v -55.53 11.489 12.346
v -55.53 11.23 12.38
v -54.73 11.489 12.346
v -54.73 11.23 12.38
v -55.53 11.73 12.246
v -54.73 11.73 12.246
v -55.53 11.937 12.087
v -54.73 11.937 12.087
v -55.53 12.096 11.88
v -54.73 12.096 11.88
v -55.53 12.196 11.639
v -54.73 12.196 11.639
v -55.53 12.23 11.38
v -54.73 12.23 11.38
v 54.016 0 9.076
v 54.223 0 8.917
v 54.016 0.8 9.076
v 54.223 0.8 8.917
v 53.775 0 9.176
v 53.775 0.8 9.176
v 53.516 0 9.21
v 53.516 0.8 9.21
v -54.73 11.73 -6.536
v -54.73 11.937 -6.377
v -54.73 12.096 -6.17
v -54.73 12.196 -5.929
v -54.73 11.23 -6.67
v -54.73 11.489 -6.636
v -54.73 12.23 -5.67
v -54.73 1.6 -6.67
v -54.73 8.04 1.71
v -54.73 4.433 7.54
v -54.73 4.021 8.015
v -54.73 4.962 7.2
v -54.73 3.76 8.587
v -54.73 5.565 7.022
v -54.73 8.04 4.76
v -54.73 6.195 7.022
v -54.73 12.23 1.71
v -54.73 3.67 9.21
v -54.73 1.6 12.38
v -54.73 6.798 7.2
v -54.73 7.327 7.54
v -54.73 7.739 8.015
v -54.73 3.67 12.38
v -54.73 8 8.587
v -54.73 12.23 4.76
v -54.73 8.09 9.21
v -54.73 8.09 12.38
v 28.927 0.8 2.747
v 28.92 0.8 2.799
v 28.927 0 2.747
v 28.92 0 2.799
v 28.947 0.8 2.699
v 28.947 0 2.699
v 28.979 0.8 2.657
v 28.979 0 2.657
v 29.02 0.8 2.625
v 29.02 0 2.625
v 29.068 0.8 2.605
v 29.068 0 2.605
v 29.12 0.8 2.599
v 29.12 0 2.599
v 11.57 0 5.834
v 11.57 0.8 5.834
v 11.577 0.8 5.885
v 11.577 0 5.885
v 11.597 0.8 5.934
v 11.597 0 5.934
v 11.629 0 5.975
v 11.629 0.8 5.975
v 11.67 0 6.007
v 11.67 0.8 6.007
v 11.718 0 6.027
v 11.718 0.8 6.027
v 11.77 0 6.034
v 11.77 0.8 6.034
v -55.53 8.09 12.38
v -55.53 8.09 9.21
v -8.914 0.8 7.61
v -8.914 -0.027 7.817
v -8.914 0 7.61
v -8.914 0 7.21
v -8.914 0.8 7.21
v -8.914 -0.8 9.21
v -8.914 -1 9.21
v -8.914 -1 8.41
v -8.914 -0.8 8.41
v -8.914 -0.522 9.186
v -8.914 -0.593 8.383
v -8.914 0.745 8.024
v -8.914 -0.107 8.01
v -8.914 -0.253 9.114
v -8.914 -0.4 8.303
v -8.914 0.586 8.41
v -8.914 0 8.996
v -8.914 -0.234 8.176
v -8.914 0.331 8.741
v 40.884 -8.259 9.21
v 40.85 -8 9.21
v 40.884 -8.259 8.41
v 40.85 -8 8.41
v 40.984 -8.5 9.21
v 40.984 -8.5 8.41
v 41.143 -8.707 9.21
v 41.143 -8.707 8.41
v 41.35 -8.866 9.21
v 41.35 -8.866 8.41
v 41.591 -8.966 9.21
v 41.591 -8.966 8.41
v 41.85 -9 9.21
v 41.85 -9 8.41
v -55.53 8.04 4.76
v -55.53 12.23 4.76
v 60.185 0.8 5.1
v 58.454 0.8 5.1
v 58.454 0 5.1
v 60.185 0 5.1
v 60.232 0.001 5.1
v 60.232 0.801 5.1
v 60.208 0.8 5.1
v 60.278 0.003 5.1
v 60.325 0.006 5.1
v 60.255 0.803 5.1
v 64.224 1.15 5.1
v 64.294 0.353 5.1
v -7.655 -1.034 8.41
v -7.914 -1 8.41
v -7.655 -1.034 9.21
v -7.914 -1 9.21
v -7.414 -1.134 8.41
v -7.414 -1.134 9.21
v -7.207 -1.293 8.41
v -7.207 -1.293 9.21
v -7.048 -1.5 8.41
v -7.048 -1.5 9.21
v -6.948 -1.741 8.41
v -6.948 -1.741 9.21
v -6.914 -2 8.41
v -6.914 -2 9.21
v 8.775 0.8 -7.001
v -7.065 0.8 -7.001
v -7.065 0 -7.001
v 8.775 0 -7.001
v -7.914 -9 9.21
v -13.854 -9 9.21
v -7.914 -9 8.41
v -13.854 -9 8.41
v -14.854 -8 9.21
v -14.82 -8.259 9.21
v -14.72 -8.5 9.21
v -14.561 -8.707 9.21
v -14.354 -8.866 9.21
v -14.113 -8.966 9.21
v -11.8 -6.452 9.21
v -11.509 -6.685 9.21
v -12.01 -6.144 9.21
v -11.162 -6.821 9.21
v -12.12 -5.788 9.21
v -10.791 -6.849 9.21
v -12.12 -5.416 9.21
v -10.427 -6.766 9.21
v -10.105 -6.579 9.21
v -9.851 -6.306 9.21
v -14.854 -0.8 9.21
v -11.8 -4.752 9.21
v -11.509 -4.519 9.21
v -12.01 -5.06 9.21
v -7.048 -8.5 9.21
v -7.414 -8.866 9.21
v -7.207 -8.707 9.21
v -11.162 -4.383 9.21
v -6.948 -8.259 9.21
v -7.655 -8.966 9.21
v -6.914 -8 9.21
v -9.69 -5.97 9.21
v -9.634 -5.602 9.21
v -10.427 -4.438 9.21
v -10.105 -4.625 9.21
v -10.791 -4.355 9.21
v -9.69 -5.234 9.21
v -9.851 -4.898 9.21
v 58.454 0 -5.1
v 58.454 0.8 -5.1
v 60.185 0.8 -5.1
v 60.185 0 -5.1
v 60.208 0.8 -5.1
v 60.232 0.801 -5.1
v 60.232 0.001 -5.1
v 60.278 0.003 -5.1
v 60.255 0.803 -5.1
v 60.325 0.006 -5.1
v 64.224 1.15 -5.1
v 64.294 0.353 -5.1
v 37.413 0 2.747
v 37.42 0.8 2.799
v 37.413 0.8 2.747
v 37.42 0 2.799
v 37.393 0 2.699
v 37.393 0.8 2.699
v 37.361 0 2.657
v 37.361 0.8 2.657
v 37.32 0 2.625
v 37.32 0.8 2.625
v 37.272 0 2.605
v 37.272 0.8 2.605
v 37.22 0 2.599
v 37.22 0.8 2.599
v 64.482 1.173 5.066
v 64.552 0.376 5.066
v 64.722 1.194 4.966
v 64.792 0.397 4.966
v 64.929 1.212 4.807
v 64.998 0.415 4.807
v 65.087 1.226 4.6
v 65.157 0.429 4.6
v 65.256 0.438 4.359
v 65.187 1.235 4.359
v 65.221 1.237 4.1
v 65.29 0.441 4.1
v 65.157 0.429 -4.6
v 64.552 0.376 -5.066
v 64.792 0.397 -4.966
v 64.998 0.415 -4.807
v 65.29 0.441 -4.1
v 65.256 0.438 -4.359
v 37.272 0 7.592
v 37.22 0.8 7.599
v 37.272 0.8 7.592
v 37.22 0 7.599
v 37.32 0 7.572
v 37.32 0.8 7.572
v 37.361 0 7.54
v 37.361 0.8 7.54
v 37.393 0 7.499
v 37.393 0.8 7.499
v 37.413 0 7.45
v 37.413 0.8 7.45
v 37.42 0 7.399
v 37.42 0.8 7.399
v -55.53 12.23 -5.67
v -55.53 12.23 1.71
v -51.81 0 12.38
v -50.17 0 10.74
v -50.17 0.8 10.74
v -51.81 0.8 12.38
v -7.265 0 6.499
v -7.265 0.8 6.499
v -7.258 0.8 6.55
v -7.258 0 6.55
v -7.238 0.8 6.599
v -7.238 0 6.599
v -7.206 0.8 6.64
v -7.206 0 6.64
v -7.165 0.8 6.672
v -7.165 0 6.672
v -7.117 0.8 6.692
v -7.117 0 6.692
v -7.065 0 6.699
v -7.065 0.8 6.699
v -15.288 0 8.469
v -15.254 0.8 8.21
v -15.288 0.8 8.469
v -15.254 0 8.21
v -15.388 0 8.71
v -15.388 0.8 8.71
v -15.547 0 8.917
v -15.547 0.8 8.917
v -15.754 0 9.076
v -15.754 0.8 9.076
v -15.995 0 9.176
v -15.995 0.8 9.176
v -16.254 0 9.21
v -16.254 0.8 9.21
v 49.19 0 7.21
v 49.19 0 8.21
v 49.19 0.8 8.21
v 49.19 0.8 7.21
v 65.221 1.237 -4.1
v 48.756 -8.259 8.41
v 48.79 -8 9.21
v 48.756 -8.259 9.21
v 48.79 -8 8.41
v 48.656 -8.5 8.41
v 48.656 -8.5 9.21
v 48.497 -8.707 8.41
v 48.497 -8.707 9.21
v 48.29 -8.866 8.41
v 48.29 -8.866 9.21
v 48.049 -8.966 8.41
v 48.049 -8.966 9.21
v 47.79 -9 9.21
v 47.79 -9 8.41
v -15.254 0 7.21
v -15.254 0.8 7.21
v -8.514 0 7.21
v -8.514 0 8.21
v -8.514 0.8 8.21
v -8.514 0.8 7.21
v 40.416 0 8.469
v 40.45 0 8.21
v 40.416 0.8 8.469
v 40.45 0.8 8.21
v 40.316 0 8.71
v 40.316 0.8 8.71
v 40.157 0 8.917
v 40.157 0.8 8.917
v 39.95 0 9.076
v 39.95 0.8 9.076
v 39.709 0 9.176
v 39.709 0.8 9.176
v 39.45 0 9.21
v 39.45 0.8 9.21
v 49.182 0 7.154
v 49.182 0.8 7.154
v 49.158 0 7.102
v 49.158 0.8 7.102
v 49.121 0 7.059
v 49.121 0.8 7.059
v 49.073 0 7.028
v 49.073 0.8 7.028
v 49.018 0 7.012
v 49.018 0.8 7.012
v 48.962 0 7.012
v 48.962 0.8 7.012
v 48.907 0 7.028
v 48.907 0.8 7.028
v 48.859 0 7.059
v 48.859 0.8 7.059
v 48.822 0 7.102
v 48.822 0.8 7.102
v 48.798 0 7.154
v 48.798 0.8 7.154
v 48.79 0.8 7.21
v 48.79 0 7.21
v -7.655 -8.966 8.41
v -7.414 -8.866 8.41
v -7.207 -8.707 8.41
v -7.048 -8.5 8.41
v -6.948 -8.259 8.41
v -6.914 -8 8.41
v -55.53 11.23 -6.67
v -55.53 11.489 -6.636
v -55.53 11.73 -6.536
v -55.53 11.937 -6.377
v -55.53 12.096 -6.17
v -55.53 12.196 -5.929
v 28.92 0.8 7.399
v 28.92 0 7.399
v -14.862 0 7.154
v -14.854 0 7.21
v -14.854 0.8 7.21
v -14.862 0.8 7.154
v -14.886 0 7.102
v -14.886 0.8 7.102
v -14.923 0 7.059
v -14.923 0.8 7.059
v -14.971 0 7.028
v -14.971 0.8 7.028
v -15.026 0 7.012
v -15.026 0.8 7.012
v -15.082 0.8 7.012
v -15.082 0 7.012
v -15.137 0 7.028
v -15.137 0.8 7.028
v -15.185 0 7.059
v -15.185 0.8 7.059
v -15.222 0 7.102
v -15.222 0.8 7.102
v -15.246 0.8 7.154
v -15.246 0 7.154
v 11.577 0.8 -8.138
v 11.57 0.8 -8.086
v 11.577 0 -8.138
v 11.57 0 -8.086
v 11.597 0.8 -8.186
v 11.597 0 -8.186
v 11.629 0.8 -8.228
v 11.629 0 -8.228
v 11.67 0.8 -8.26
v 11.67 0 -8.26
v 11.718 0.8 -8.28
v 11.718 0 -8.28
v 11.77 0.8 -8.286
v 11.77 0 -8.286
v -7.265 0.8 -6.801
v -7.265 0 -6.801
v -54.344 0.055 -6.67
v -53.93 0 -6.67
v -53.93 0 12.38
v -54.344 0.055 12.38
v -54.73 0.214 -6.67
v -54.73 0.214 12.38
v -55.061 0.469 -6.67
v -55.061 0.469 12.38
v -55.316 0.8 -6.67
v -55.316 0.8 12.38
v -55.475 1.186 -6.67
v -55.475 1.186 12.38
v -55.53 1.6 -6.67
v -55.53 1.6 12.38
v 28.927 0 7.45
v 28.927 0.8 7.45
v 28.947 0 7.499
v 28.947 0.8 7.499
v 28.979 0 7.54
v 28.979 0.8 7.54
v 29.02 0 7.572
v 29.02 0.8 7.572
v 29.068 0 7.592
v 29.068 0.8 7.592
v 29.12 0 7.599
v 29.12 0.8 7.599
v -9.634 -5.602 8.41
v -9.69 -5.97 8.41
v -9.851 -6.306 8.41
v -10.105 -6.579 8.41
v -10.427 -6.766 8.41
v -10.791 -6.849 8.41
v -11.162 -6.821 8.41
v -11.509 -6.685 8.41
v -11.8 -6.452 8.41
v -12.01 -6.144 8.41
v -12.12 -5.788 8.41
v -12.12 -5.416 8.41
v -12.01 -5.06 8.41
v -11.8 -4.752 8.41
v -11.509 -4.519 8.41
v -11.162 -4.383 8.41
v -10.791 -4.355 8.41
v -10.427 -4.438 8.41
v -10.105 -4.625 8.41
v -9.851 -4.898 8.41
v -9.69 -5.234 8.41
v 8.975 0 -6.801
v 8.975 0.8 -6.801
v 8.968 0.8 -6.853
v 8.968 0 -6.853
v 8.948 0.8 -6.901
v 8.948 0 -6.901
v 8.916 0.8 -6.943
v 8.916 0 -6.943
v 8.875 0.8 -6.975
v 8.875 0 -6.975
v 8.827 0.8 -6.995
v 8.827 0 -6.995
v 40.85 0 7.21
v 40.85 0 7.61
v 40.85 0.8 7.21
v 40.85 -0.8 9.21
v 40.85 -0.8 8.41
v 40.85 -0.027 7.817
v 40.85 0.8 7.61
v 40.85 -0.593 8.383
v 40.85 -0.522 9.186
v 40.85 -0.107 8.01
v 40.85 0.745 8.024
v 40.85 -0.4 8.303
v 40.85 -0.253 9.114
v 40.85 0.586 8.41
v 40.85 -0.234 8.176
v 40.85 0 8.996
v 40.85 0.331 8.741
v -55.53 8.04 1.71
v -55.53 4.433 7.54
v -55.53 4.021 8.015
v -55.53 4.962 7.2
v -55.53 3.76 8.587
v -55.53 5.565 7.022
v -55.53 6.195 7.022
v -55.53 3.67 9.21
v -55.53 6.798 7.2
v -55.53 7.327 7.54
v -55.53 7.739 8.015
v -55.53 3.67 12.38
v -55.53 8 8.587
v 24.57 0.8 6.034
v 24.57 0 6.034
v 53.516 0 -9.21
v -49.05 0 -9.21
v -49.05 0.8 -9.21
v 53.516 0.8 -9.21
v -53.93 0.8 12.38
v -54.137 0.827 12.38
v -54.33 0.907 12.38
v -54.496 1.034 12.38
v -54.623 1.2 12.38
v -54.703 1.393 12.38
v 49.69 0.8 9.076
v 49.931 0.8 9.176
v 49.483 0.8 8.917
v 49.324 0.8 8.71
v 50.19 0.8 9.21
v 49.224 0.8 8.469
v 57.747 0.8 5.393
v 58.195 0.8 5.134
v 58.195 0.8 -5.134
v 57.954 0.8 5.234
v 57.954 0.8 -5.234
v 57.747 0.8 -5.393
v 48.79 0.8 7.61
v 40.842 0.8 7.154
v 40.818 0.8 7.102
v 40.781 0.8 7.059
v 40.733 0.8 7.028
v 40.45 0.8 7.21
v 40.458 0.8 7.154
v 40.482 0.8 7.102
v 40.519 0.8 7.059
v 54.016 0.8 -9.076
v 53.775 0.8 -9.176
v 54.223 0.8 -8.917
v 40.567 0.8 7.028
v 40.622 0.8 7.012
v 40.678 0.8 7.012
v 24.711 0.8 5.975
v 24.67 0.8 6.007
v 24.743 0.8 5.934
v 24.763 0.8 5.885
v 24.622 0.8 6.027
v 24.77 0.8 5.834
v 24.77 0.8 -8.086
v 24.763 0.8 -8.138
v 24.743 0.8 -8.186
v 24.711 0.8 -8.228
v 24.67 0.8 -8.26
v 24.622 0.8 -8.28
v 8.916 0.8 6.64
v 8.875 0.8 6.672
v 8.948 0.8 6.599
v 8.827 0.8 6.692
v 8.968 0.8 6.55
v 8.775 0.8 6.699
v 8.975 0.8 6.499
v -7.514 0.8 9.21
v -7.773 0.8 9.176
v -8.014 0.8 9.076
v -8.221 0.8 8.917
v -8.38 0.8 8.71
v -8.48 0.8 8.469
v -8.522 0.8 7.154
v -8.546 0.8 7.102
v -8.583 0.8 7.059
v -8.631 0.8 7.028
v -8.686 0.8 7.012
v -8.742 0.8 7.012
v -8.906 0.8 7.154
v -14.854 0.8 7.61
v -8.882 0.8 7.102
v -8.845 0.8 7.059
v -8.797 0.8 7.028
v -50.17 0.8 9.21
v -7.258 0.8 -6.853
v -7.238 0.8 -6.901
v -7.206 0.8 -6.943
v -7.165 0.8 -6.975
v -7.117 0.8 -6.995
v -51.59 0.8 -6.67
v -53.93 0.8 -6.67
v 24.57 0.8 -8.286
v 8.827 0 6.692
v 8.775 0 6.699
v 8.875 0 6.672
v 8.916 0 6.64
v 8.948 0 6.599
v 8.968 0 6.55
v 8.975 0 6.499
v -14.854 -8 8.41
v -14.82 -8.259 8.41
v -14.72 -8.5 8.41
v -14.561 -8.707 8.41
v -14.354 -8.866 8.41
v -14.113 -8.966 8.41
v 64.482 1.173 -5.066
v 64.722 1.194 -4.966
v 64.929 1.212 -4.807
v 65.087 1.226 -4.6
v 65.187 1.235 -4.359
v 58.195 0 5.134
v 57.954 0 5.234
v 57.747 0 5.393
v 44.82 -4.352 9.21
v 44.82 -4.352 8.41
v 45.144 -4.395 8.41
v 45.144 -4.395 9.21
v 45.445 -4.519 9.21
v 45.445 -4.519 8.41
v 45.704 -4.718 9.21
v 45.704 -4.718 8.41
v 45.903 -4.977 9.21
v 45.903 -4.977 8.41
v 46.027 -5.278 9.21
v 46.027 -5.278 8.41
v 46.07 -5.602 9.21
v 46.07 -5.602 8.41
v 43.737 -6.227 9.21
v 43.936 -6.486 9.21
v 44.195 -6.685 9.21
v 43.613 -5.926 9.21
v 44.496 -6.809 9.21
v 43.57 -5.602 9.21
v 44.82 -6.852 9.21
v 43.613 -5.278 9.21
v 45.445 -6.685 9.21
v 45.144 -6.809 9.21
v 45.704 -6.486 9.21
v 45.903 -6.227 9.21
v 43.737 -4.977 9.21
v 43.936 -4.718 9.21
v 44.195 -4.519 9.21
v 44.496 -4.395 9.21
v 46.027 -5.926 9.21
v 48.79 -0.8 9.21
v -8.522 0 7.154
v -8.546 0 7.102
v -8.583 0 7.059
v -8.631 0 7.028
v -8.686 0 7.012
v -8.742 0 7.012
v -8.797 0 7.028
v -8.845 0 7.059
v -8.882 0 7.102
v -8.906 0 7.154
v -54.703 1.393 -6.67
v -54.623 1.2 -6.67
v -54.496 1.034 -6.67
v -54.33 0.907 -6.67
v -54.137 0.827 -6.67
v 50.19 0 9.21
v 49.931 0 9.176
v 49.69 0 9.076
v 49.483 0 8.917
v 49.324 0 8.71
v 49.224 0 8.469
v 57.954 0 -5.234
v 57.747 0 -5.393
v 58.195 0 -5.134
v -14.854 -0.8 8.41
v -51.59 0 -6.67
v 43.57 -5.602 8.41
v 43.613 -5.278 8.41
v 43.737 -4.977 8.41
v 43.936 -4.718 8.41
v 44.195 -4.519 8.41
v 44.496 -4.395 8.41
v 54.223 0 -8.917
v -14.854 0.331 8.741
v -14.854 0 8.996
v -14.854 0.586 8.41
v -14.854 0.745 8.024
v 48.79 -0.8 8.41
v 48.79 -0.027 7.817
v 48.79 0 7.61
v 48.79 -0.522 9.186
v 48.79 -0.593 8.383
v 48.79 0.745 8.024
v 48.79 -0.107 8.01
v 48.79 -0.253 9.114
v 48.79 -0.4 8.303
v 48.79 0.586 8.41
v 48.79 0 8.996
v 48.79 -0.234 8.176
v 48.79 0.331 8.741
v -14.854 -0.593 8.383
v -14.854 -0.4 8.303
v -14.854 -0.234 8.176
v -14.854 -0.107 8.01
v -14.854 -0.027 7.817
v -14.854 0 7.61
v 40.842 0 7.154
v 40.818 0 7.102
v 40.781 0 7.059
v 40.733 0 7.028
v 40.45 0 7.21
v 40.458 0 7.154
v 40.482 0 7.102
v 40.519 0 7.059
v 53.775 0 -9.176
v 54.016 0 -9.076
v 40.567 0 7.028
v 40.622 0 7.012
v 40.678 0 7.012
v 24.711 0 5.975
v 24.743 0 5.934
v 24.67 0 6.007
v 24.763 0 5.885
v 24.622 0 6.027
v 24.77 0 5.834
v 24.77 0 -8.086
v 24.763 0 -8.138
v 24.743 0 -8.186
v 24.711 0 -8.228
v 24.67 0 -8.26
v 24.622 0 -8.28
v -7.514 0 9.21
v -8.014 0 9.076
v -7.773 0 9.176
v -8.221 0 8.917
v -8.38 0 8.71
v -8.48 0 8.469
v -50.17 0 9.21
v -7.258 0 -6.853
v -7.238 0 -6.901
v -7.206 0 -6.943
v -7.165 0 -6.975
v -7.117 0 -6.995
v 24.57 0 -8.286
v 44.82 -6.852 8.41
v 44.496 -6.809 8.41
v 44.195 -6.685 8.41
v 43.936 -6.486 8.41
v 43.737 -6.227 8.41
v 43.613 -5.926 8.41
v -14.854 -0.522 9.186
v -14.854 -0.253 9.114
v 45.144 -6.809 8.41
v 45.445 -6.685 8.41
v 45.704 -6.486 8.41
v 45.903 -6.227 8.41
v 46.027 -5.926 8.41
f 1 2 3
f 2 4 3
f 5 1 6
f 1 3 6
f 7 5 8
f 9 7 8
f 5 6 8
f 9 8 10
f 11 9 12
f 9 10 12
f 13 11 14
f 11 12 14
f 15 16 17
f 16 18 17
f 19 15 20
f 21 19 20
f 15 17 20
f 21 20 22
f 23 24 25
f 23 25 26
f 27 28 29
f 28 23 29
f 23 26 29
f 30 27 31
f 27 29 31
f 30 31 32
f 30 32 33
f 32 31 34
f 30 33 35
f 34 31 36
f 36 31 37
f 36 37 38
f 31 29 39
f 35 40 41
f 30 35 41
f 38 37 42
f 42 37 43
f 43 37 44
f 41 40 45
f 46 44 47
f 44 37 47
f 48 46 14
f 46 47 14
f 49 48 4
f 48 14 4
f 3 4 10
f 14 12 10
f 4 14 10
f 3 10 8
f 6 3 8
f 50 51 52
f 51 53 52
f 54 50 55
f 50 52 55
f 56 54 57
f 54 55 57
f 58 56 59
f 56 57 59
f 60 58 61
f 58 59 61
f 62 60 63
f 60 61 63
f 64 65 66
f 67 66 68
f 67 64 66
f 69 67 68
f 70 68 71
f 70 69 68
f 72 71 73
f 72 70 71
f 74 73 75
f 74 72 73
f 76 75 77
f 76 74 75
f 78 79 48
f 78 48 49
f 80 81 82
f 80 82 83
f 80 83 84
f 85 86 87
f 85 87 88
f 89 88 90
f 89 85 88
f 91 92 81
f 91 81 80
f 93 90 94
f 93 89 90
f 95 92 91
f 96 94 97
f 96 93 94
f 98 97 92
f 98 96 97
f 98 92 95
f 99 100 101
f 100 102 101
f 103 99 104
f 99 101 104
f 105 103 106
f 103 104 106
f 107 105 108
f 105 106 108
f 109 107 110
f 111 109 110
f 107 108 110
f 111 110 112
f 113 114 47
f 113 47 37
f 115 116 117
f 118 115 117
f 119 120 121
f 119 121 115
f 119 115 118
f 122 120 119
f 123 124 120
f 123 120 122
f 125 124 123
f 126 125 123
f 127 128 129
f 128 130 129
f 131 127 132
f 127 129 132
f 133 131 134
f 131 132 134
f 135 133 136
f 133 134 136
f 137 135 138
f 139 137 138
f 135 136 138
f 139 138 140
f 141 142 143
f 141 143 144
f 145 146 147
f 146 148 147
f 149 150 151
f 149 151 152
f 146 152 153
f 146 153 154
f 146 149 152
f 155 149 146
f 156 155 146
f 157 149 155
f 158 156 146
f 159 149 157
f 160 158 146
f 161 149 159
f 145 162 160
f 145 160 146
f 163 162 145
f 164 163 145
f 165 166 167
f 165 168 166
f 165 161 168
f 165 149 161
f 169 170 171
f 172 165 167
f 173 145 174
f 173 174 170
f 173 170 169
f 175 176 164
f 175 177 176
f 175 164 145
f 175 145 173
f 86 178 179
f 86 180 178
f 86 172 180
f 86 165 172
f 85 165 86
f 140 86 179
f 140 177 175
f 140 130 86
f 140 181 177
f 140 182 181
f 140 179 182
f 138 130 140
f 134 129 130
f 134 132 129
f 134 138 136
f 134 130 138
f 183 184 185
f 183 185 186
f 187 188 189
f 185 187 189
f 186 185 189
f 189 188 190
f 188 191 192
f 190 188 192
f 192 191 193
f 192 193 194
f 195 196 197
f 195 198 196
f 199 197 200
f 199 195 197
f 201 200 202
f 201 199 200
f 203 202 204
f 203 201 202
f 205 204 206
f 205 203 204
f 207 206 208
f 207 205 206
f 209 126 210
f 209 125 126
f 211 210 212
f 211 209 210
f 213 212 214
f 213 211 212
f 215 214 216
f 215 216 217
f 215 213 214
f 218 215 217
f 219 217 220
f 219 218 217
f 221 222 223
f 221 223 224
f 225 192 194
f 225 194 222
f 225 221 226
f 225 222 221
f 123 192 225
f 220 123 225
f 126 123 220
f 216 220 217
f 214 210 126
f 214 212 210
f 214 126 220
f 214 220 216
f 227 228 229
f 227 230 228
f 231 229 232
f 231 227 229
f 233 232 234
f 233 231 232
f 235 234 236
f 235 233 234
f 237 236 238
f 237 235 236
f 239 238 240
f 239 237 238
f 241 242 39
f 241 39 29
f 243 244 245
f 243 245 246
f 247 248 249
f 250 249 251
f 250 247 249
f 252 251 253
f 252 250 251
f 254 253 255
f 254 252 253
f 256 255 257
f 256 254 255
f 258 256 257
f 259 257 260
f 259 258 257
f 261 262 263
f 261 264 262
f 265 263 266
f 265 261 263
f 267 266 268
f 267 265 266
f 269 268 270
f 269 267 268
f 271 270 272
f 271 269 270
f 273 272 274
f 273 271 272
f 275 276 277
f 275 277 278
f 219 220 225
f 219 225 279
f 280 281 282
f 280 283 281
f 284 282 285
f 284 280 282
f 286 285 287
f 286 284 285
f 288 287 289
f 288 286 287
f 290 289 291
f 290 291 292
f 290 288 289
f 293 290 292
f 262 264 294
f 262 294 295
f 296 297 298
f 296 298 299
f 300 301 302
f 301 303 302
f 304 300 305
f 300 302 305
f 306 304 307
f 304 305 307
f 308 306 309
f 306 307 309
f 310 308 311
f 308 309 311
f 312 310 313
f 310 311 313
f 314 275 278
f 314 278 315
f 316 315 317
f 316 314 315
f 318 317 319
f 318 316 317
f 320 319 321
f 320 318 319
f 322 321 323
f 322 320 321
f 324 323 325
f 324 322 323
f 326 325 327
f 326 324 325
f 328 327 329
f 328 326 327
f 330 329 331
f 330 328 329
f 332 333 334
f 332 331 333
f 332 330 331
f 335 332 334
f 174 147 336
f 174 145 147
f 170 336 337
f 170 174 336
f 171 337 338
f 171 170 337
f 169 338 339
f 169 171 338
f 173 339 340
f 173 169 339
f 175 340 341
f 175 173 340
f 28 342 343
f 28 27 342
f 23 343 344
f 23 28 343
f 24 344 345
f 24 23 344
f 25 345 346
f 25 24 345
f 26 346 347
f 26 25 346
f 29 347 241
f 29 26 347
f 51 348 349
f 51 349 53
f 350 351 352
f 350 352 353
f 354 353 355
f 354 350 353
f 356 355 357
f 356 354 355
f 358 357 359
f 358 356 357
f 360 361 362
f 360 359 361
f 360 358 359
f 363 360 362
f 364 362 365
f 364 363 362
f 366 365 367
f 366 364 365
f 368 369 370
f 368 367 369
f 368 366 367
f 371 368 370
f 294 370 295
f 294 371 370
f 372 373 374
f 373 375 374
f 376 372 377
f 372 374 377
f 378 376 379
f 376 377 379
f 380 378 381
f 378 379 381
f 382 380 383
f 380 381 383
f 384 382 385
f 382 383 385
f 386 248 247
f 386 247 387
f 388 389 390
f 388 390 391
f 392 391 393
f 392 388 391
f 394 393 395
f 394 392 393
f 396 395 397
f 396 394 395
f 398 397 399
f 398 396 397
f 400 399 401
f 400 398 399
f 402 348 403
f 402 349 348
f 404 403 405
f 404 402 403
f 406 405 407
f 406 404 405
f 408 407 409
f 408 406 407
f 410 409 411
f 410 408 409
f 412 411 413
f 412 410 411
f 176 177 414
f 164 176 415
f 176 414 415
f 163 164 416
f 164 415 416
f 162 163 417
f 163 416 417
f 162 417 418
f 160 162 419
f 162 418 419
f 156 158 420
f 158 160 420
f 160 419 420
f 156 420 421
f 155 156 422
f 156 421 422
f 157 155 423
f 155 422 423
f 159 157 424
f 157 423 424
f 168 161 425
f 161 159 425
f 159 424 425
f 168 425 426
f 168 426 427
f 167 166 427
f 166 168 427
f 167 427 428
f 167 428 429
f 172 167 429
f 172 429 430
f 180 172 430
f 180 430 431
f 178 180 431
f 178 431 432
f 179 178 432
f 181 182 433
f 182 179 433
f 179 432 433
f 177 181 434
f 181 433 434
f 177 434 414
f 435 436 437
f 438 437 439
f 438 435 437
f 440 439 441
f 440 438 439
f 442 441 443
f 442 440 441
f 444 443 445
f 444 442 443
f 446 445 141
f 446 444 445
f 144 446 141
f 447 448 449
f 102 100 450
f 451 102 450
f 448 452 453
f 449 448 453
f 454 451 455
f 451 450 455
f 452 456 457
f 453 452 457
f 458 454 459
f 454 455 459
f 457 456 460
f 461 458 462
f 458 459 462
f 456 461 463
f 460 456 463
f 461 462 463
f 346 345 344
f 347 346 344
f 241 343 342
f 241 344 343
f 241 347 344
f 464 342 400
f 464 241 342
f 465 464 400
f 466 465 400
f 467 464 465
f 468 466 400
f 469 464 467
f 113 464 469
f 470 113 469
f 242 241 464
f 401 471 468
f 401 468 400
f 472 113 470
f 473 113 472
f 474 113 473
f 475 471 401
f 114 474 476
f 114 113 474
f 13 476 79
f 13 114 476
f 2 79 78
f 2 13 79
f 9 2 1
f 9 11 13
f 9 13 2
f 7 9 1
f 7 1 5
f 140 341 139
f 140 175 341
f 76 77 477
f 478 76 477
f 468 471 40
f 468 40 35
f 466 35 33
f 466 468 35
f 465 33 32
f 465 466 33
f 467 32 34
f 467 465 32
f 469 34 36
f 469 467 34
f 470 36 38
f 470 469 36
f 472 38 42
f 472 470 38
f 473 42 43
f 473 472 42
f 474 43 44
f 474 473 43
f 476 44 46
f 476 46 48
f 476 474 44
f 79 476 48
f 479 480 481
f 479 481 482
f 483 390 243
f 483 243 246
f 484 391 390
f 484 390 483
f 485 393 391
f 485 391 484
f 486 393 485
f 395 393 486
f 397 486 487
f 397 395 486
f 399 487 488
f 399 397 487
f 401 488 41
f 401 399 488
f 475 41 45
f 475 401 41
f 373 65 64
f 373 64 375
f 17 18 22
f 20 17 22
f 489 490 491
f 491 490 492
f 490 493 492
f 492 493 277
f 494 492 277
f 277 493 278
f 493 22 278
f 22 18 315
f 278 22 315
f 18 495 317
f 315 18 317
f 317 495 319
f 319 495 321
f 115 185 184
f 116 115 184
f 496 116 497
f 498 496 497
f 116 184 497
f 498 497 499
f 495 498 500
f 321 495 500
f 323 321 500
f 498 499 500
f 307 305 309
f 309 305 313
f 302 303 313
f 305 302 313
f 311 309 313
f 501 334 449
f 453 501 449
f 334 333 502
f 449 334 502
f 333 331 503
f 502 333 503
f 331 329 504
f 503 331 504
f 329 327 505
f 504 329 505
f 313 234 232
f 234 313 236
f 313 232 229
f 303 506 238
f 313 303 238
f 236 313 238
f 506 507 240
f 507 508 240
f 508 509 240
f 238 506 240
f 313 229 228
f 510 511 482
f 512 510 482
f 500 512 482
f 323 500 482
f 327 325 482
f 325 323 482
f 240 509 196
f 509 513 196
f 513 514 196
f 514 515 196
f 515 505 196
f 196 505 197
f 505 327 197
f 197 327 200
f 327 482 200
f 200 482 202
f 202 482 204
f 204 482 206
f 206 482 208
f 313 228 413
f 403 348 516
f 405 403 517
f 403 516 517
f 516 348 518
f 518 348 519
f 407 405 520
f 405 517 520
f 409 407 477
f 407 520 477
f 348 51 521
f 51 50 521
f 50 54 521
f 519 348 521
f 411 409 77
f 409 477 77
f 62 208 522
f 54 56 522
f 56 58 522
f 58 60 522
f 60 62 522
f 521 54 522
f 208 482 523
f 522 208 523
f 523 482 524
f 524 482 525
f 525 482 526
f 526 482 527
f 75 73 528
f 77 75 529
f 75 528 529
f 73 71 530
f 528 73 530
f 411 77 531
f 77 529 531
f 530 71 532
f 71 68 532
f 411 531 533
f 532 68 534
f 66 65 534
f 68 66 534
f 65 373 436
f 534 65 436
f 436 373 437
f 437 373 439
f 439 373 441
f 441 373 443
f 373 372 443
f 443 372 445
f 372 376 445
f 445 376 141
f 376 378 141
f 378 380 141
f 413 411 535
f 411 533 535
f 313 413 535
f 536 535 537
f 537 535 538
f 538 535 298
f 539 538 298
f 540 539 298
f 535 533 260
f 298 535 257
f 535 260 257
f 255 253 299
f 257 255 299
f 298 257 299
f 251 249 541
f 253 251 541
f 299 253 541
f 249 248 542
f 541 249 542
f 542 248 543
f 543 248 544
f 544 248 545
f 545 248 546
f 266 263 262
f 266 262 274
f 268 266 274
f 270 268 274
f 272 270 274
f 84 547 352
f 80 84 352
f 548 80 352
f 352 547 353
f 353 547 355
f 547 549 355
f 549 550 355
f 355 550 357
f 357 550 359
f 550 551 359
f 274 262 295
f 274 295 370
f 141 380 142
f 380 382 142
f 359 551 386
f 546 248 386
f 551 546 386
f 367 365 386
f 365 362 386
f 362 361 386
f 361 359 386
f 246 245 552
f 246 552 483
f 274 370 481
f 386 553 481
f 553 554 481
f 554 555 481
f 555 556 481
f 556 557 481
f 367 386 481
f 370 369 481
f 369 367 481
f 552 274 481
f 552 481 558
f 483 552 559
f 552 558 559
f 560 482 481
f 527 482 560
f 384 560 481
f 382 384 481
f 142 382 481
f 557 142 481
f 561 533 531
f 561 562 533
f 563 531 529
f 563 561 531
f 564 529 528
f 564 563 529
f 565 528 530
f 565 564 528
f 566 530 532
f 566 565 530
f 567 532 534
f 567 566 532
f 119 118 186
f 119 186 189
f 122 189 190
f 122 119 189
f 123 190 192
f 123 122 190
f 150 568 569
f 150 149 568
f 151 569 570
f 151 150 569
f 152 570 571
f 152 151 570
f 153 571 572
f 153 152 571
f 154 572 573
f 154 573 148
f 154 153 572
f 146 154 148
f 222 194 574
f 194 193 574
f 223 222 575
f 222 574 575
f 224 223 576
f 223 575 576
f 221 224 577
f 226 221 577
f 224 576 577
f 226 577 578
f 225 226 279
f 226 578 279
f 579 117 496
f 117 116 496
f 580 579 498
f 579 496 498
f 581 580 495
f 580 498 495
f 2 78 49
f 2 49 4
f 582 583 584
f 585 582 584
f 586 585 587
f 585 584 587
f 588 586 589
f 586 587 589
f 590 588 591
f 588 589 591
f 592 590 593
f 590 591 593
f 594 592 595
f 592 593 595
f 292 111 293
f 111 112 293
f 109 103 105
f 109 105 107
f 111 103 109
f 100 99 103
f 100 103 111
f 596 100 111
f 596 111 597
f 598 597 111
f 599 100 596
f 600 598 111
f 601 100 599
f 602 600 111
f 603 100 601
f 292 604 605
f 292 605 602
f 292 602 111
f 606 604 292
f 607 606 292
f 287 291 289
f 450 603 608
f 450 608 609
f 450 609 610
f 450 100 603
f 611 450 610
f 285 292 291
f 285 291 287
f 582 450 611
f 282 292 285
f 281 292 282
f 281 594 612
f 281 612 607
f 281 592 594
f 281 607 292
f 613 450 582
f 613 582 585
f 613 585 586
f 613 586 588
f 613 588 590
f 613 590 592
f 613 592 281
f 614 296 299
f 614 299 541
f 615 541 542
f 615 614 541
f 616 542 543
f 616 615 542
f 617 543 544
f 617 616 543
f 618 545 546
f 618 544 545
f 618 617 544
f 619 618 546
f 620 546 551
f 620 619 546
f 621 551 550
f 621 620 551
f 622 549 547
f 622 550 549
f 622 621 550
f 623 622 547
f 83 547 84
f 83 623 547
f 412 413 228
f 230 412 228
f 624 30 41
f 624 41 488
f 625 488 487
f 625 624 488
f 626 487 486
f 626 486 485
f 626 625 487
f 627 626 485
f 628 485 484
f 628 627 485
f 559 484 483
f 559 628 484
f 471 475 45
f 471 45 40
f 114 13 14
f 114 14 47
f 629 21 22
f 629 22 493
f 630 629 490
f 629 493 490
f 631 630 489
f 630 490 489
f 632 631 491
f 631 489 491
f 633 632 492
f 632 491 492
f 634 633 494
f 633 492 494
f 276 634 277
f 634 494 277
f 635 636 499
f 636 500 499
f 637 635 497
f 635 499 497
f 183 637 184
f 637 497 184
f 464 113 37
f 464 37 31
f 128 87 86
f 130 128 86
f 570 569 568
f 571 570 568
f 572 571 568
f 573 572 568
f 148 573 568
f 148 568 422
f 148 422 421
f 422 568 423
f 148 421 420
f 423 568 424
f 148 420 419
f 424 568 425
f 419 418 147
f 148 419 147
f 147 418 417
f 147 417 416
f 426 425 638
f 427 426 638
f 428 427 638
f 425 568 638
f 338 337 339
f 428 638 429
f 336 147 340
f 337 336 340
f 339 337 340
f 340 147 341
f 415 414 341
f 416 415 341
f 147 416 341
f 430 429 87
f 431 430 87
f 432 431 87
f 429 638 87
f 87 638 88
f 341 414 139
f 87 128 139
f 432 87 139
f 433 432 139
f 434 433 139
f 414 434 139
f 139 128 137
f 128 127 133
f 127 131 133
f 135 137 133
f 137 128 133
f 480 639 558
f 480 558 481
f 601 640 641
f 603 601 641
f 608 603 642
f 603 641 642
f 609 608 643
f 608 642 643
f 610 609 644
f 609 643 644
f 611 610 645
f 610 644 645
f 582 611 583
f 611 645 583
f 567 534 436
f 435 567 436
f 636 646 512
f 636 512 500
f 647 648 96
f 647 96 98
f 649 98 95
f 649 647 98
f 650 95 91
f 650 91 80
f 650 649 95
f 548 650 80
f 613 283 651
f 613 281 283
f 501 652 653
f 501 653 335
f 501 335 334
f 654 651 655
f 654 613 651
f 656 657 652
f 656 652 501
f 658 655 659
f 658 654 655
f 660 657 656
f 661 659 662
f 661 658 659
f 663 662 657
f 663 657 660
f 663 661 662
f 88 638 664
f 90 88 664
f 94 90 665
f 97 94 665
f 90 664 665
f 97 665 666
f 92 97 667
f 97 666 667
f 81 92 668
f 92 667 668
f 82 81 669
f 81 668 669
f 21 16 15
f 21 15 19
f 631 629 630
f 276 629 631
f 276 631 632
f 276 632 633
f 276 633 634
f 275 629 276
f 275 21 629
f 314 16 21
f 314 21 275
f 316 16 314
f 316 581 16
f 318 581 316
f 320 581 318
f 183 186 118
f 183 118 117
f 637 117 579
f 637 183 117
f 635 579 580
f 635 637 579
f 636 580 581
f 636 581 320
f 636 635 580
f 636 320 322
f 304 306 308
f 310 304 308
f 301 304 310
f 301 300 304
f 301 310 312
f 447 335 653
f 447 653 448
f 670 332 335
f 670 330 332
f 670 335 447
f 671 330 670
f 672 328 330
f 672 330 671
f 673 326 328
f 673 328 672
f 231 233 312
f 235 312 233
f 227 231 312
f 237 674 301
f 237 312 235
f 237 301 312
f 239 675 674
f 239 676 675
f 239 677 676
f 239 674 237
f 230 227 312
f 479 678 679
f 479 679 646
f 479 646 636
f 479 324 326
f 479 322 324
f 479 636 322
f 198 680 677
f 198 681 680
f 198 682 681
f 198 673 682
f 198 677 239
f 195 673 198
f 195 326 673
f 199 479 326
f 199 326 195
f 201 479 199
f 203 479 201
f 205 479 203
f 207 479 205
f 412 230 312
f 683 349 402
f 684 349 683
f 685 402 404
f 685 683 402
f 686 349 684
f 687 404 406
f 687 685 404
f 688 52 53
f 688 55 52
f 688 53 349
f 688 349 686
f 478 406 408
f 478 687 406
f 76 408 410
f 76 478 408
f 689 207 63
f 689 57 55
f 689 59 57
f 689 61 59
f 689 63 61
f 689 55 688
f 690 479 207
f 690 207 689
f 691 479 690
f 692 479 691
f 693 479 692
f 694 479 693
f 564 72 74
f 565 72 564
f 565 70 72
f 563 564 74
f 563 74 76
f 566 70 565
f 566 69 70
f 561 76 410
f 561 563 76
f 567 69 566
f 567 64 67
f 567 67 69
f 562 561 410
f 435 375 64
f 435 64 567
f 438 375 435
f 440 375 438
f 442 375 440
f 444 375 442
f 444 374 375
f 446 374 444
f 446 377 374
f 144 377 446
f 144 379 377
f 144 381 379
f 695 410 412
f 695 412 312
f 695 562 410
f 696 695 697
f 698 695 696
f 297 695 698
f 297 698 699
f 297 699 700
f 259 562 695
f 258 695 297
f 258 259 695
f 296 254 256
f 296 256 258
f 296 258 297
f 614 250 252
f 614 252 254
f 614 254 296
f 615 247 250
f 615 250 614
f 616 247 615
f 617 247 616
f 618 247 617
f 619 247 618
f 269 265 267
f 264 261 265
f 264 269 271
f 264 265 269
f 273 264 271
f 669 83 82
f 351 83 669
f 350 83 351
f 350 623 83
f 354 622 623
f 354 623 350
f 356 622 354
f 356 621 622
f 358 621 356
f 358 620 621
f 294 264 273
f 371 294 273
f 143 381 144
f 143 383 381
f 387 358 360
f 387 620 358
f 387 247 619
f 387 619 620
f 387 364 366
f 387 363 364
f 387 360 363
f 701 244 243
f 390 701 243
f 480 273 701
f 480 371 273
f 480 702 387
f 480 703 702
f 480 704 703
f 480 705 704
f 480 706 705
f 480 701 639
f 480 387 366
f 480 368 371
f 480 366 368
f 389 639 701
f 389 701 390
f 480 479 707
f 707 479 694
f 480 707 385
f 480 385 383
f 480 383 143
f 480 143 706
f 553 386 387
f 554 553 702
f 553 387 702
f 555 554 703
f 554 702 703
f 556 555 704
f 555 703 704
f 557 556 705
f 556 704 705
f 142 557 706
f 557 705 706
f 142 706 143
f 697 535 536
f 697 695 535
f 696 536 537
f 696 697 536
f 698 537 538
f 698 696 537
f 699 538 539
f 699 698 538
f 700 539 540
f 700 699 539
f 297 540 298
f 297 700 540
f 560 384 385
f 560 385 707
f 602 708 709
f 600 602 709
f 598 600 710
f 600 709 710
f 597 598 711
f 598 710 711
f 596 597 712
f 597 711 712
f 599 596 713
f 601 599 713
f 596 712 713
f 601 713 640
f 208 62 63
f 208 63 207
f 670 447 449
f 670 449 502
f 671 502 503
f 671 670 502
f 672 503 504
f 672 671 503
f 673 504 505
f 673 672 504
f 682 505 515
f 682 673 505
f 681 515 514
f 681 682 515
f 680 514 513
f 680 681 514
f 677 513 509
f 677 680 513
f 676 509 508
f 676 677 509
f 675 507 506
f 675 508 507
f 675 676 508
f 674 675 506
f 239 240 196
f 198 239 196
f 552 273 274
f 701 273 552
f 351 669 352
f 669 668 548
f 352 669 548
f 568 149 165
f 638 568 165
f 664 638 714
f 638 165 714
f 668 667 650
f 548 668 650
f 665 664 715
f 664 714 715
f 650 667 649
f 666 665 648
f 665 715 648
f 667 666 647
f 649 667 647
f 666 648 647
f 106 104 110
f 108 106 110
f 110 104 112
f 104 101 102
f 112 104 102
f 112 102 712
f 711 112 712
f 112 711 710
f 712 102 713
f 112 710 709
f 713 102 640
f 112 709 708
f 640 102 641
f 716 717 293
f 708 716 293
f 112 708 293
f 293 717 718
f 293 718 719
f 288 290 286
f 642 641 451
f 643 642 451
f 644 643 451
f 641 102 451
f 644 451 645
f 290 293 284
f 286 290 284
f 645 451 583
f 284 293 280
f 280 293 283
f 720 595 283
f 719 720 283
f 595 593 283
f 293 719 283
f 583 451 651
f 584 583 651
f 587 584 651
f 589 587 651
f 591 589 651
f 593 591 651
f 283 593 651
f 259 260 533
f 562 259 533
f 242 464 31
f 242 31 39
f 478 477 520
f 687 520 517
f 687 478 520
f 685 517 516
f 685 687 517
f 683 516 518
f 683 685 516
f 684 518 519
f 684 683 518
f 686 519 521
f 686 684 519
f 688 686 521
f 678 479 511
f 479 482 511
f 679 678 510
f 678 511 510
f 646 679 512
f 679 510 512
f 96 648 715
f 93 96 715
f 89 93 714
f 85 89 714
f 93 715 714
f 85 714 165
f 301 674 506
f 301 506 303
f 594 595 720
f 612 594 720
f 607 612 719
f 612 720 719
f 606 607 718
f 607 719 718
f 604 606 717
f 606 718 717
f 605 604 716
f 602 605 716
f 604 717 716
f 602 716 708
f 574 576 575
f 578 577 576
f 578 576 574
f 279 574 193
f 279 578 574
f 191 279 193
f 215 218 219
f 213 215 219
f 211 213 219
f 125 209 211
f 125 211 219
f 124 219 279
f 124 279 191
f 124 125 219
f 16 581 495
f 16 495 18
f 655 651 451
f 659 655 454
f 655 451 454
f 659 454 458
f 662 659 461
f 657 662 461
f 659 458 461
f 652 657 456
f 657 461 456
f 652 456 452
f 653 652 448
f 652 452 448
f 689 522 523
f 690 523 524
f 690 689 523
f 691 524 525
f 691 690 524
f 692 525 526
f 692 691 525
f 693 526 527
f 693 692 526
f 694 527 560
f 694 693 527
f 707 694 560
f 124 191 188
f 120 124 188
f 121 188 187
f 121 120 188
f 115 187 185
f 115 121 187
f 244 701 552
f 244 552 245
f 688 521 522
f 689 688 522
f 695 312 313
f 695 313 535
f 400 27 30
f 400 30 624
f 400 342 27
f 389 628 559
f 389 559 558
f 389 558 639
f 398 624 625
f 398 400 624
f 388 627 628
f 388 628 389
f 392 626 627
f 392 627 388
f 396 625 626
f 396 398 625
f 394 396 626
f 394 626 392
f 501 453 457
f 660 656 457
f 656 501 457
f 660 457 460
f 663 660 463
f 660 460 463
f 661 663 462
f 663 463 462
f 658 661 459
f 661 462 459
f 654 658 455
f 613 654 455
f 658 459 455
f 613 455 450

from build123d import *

# Parameters (mm, degrees)
SM_BASE_FLANGE_1_DEPTH           = 0.8
SKETCH_25_W                      = 16.240000001
SKETCH_25_H                      = 13.699999542
SKETCH_25_W_2                    = 13.2
SKETCH_25_H_2                    = 14.319999239
SKETCH_25_W_3                    = 8.5
SKETCH_25_H_3                    = 5
CUT_EXTRUDE_1_DEPTH              = 62.484573675
SM_EDGE_FLANGE_1_STRIP_CUT_DEPTH = 10.2
SM_EDGE_FLANGE_1_DEPTH           = 10.2
SM_START                         = -0.8
SM_EDGE_FLANGE_2_DEPTH           = 2.8
SM_START_2                       = 0.715504
SM_EDGE_FLANGE_2_2_OUTLINE_W     = 7.94
SM_EDGE_FLANGE_2_2_OUTLINE_H     = 0.8
SM_EDGE_FLANGE_2_2_DEPTH         = 1.284496
SM_START_3                       = -4.3519999
SM_EDGE_FLANGE_2_3_OUTLINE_W     = 7.94
SM_EDGE_FLANGE_2_3_OUTLINE_H     = 0.8
SM_EDGE_FLANGE_2_3_DEPTH         = 3.5519999
SM_START_4                       = -9
SM_EDGE_FLANGE_2_4_OUTLINE_W     = 7.94
SM_EDGE_FLANGE_2_4_OUTLINE_H     = 0.8
SM_EDGE_FLANGE_2_4_DEPTH         = 2.1479999
SM_START_5                       = 40.85
SM_EDGE_FLANGE_2_5_DEPTH         = 7.94
SM_EDGE_FLANGE_2_6_OUTLINE_W     = 2.5000002
SM_EDGE_FLANGE_2_6_OUTLINE_H     = 0.8
SM_EDGE_FLANGE_2_6_DEPTH         = 2.7199999
SM_START_6                       = 46.0700001
SM_EDGE_FLANGE_2_7_OUTLINE_W     = 2.5000002
SM_EDGE_FLANGE_2_7_OUTLINE_H     = 0.8
SM_EDGE_FLANGE_2_7_DEPTH         = 2.7199999
SM_START_7                       = 41.6657556
SM_EDGE_FLANGE_2_8_DEPTH         = 6.2856216
SM_START_8                       = 8.41
SM_EDGE_FLANGE_2_9_DEPTH         = 0.8
SM_START_9                       = -14.854
SM_EDGE_FLANGE_3_OUTLINE_W       = 8
SM_EDGE_FLANGE_3_OUTLINE_H       = 0.8
SM_EDGE_FLANGE_3_DEPTH           = 2.7199999
SM_START_10                      = -9.6339999
SM_EDGE_FLANGE_3_2_OUTLINE_W     = 8
SM_EDGE_FLANGE_3_2_OUTLINE_H     = 0.8
SM_EDGE_FLANGE_3_2_DEPTH         = 2.7199999
SM_START_11                      = -15.254
SM_EDGE_FLANGE_3_3_DEPTH         = 6.74
SM_EDGE_FLANGE_3_4_DEPTH         = 5.94
SM_EDGE_FLANGE_3_5_DEPTH         = 0.8
SM_START_12                      = -1
SM_EDGE_FLANGE_3_6_DEPTH         = 3
SM_EDGE_FLANGE_4_DEPTH           = 19.05
SM_START_13                      = 0.8
SM_EDGE_FLANGE_4_FLAT_DEPTH      = 0.8
FILLET_1_R                       = 1
FILLET_2_R                       = 0.2


with BuildPart() as part:
    # Базовая кромка1: sheet metal written as solids
    # Sketch 1 → Базовая кромка1 (new body)
    with BuildSketch(Plane(origin=(0, 0, 0), x_dir=(1, 0, 0), z_dir=(0, 1, 0))):
        Polygon((53.93, 9.21), (58.04, 5.1), (60.22, 5.1), (60.22, -5.1), (58.04, -5.1), (53.93, -9.21), (-50.17, -9.21), (-50.17, -10.74), (-51.81, -12.38), (-53.93, -12.38), (-53.93, 6.67), (-51.59, 6.67), (-49.05, 9.21), align=None)
    extrude(amount=SM_BASE_FLANGE_1_DEPTH)

    # Эскиз25 → Вырез-Вытянуть1 (cut, through all)
    with BuildSketch(Plane(origin=(0, 0.8, 0), x_dir=(1, 0, 0), z_dir=(0, 1, 0))):
        with Locations((0.854992541, 0.151324571)):
            Rectangle(SKETCH_25_W, SKETCH_25_H)
        with Locations((18.170071277, 1.126324154)):
            Rectangle(SKETCH_25_W_2, SKETCH_25_H_2)
        with Locations((33.169994901, -5.0986752)):
            Rectangle(SKETCH_25_W_3, SKETCH_25_H_3)
    extrude(amount=-CUT_EXTRUDE_1_DEPTH, mode=Mode.SUBTRACT)

    # Ребро-кромка1: sheet metal written as solids
    # Ребро-кромка1 strip (on a plane across the edge) → Ребро-кромка1 strip cut (cut)
    with BuildSketch(Plane(origin=(60.22, 0.8, 5.1), x_dir=(-0.08715574274765156, 0.9961946980917461, 0), z_dir=(0, 0, -1))):
        Polygon((-1.212259082, 4.677214117), (-0.793911517, -0.104520434), (0.003044242, -0.03479584), (-0.415303324, 4.746938711), align=None)
    extrude(amount=SM_EDGE_FLANGE_1_STRIP_CUT_DEPTH, mode=Mode.SUBTRACT)

    # Ребро-кромка1 section (on a plane across the edge) → Ребро-кромка1 (add)
    with BuildSketch(Plane(origin=(60.22, 0.8, 5.1), x_dir=(-0.08715574274765156, 0.9961946980917461, 0), z_dir=(0, 0, -1))):
        with BuildLine():
            Line((-0.8, 0.034928754), (-0.8, 5.019641982))
            Line((-0.8, 5.019641982), (0, 5.019641982))
            Line((0, 5.019641982), (0, 0.034928754))
            ThreePointArc((0, 0.034928754), (0.000761423, 3.3244e-05), (0.003044242, -0.03479584))
            Line((0.003044242, -0.03479584), (-0.793911517, -0.104520434))
            ThreePointArc((-0.793911517, -0.104520434), (-0.798477155, -0.034862265), (-0.8, 0.034928754))
        make_face()
    extrude(amount=SM_EDGE_FLANGE_1_DEPTH)

    # Ребро-кромка2: read off the stored shape, not the designer's step
    # Ребро-кромка2 outline → Ребро-кромка2 (cut)
    with BuildSketch(Plane(origin=(0, 0, 0), x_dir=(1, 0, 0), z_dir=(0, 1, 0)).offset(SM_START)):
        with BuildLine():
            Line((48.79, -7.21), (48.79, -9.21))
            Line((48.79, -9.21), (49.19, -9.21))
            Line((49.19, -9.21), (49.19, -7.21))
            ThreePointArc((49.19, -7.21), (48.99, -7.01), (48.79, -7.21))
        make_face()
        with BuildLine():
            Line((40.45, -9.21), (40.85, -9.21))
            Line((40.85, -9.21), (40.85, -7.21))
            ThreePointArc((40.85, -7.21), (40.65, -7.01), (40.45, -7.21))
            Line((40.45, -7.21), (40.45, -9.21))
        make_face()
    extrude(amount=SM_EDGE_FLANGE_2_DEPTH, mode=Mode.SUBTRACT)

    # Sm Edge Flange 2 2 outline → Sm Edge Flange 2 2 (cut)
    with BuildSketch(Plane(origin=(0, 0, 0), x_dir=(1, 0, 0), z_dir=(0, 1, 0)).offset(SM_START_2)):
        with Locations((44.82, -8.81)):
            Rectangle(SM_EDGE_FLANGE_2_2_OUTLINE_W, SM_EDGE_FLANGE_2_2_OUTLINE_H)
    extrude(amount=SM_EDGE_FLANGE_2_2_DEPTH, mode=Mode.SUBTRACT)

    # Sm Edge Flange 2 5 outline → Sm Edge Flange 2 5 (cut)
    with BuildSketch(Plane.YZ.offset(SM_START_5)):
        with BuildLine():
            Line((0, 9.21), (0, 8.995640646))
            ThreePointArc((0, 8.995640646), (0.585640646, 8.41), (0.8, 7.61))
            Line((0.8, 7.61), (0.8, 8.41))
            Line((0.8, 8.41), (0.715504, 8.41))
            Line((0.715504, 8.41), (0.715504, 9.21))
            Line((0.715504, 9.21), (0, 9.21))
        make_face()
    extrude(amount=SM_EDGE_FLANGE_2_5_DEPTH, mode=Mode.SUBTRACT)



with BuildPart() as body_2:
    # Sm Edge Flange 2 3 outline → Sm Edge Flange 2 3 (new body)
    with BuildSketch(Plane(origin=(0, 0, 0), x_dir=(1, 0, 0), z_dir=(0, 1, 0)).offset(SM_START_3)):
        with Locations((44.82, -8.81)):
            Rectangle(SM_EDGE_FLANGE_2_3_OUTLINE_W, SM_EDGE_FLANGE_2_3_OUTLINE_H)
    extrude(amount=SM_EDGE_FLANGE_2_3_DEPTH)


with BuildPart() as body_3:
    # Sm Edge Flange 2 4 outline → Sm Edge Flange 2 4 (new body)
    with BuildSketch(Plane(origin=(0, 0, 0), x_dir=(1, 0, 0), z_dir=(0, 1, 0)).offset(SM_START_4)):
        with Locations((44.82, -8.81)):
            Rectangle(SM_EDGE_FLANGE_2_4_OUTLINE_W, SM_EDGE_FLANGE_2_4_OUTLINE_H)
    extrude(amount=SM_EDGE_FLANGE_2_4_DEPTH)


with BuildPart() as part_1:
    add(part.part)

    add(body_2.part)  # Sm Edge Flange 2 6 merges body 2

    add(body_3.part)  # Sm Edge Flange 2 6 merges body 3
    # Sm Edge Flange 2 6 outline → Sm Edge Flange 2 6 (add)
    with BuildSketch(Plane.YZ.offset(SM_START_5)):
        with Locations((-5.602, 8.81)):
            Rectangle(SM_EDGE_FLANGE_2_6_OUTLINE_W, SM_EDGE_FLANGE_2_6_OUTLINE_H)
        with BuildLine():
            ThreePointArc((0, 8.995640646), (-0.385889528, 9.155481322), (-0.8, 9.21))
            Line((-0.8, 9.21), (-0.8, 8.41))
            ThreePointArc((-0.8, 8.41), (-0.234314575, 8.175685425), (0, 7.61))
            Line((0, 7.61), (0, 8.995640646))
        make_face()
    extrude(amount=SM_EDGE_FLANGE_2_6_DEPTH)

    # Sm Edge Flange 2 7 outline → Sm Edge Flange 2 7 (add)
    with BuildSketch(Plane.YZ.offset(SM_START_6)):
        with Locations((-5.602, 8.81)):
            Rectangle(SM_EDGE_FLANGE_2_7_OUTLINE_W, SM_EDGE_FLANGE_2_7_OUTLINE_H)
        with BuildLine():
            ThreePointArc((0, 8.995640646), (-0.385889528, 9.155481322), (-0.8, 9.21))
            Line((-0.8, 9.21), (-0.8, 8.41))
            ThreePointArc((-0.8, 8.41), (-0.234314575, 8.175685425), (0, 7.61))
            Line((0, 7.61), (0, 8.995640646))
        make_face()
    extrude(amount=SM_EDGE_FLANGE_2_7_DEPTH)

    # Sm Edge Flange 2 8 outline → Sm Edge Flange 2 8 (add)
    with BuildSketch(Plane.YZ.offset(SM_START_7)):
        with BuildLine():
            ThreePointArc((0, 8.995640646), (-0.385889528, 9.155481322), (-0.8, 9.21))
            Line((-0.8, 9.21), (-0.8, 8.41))
            ThreePointArc((-0.8, 8.41), (-0.234314575, 8.175685425), (0, 7.61))
            Line((0, 7.61), (0, 8.995640646))
        make_face()
    extrude(amount=SM_EDGE_FLANGE_2_8_DEPTH)

    # Sm Edge Flange 2 9 outline → Sm Edge Flange 2 9 (add)
    with BuildSketch(Plane.XY.offset(SM_START_8)):
        with BuildLine():
            Line((46.0700001, -6.8520001), (46.07, -5.602))
            ThreePointArc((46.07, -5.602), (45.703883476, -6.485883476), (44.82, -6.852))
            Line((44.82, -6.852), (46.0700001, -6.8520001))
        make_face()
        with BuildLine():
            ThreePointArc((44.82, -4.352), (45.703883476, -4.718116524), (46.07, -5.602))
            Line((46.07, -5.602), (46.0700001, -4.3519999))
            Line((46.0700001, -4.3519999), (44.82, -4.352))
        make_face()
        with BuildLine():
            ThreePointArc((43.57, -5.602), (43.936116524, -4.718116524), (44.82, -4.352))
            Line((44.82, -4.352), (43.5699999, -4.3519999))
            Line((43.5699999, -4.3519999), (43.57, -5.602))
        make_face()
        with BuildLine():
            Line((43.5699999, -6.8520001), (44.82, -6.852))
            ThreePointArc((44.82, -6.852), (43.936116524, -6.485883476), (43.57, -5.602))
            Line((43.57, -5.602), (43.5699999, -6.8520001))
        make_face()
    extrude(amount=SM_EDGE_FLANGE_2_9_DEPTH)

    # Sm Edge Flange 3 3 outline → Sm Edge Flange 3 3 (cut)
    with BuildSketch(Plane.YZ.offset(SM_START_11)):
        with BuildLine():
            Line((0, 9.21), (0, 8.995640646))
            ThreePointArc((0, 8.995640646), (0.585640646, 8.41), (0.8, 7.61))
            Line((0.8, 7.61), (0.8, 9.21))
            Line((0.8, 9.21), (0, 9.21))
        make_face()
    extrude(amount=SM_EDGE_FLANGE_3_3_DEPTH, mode=Mode.SUBTRACT)



with BuildPart() as body_2_2:
    # Ребро-кромка3: read off the stored shape, not the designer's step
    # Ребро-кромка3 outline → Ребро-кромка3 (new body)
    with BuildSketch(Plane.YZ.offset(SM_START_9)):
        with Locations((-5, 8.81)):
            Rectangle(SM_EDGE_FLANGE_3_OUTLINE_W, SM_EDGE_FLANGE_3_OUTLINE_H)
    extrude(amount=SM_EDGE_FLANGE_3_DEPTH)


with BuildPart() as body_3_2:
    # Sm Edge Flange 3 2 outline → Sm Edge Flange 3 2 (new body)
    with BuildSketch(Plane.YZ.offset(SM_START_10)):
        with Locations((-5, 8.81)):
            Rectangle(SM_EDGE_FLANGE_3_2_OUTLINE_W, SM_EDGE_FLANGE_3_2_OUTLINE_H)
    extrude(amount=SM_EDGE_FLANGE_3_2_DEPTH)


with BuildPart() as part_2:
    add(part_1.part)

    add(body_2_2.part)  # Sm Edge Flange 3 4 merges body 2 2

    add(body_3_2.part)  # Sm Edge Flange 3 4 merges body 3 2
    # Sm Edge Flange 3 4 outline → Sm Edge Flange 3 4 (add)
    with BuildSketch(Plane.YZ.offset(SM_START_9)):
        with BuildLine():
            Line((-0.8, 9.21), (-1, 9.21))
            Line((-1, 9.21), (-1, 8.41))
            Line((-1, 8.41), (-0.8, 8.41))
            ThreePointArc((-0.8, 8.41), (-0.234314575, 8.175685425), (0, 7.61))
            Line((0, 7.61), (0, 8.995640646))
            ThreePointArc((0, 8.995640646), (-0.385889528, 9.155481322), (-0.8, 9.21))
        make_face()
    extrude(amount=SM_EDGE_FLANGE_3_4_DEPTH)

    # Sm Edge Flange 3 5 outline → Sm Edge Flange 3 5 (add)
    with BuildSketch(Plane.XY.offset(SM_START_8)):
        with BuildLine():
            Line((-9.6339999, -9), (-9.634, -5.602))
            ThreePointArc((-9.634, -5.602), (-10.884, -6.852), (-12.134, -5.602))
            Line((-12.134, -5.602), (-12.1340001, -9))
            Line((-12.1340001, -9), (-9.6339999, -9))
        make_face()
        with BuildLine():
            ThreePointArc((-12.134, -5.602), (-10.884, -4.352), (-9.634, -5.602))
            Line((-9.634, -5.602), (-9.6339999, -1))
            Line((-9.6339999, -1), (-12.1340001, -1))
            Line((-12.1340001, -1), (-12.134, -5.602))
        make_face()
    extrude(amount=SM_EDGE_FLANGE_3_5_DEPTH)

    # Sm Edge Flange 3 6 outline → Sm Edge Flange 3 6 (cut)
    with BuildSketch(Plane(origin=(0, 0, 0), x_dir=(1, 0, 0), z_dir=(0, 1, 0)).offset(SM_START_12)):
        with BuildLine():
            Line((-14.854, -9), (-14.854, -7.21))
            ThreePointArc((-14.854, -7.21), (-15.054, -7.01), (-15.254, -7.21))
            Line((-15.254, -7.21), (-15.254, -9))
            Line((-15.254, -9), (-14.854, -9))
        make_face()
        with BuildLine():
            Line((-8.914, -7.21), (-8.914, -9))
            Line((-8.914, -9), (-8.514, -9))
            Line((-8.514, -9), (-8.514, -7.21))
            ThreePointArc((-8.514, -7.21), (-8.714, -7.01), (-8.914, -7.21))
        make_face()
    extrude(amount=SM_EDGE_FLANGE_3_6_DEPTH, mode=Mode.SUBTRACT)

    # Ребро-кромка4: sheet metal written as solids
    # Ребро-кромка4 bend section (on a plane across the edge) → Ребро-кромка4 (add)
    with BuildSketch(Plane(origin=(-54.73, 0.8, -6.67), x_dir=(1, 0, 0), z_dir=(0, 0, 1))):
        with BuildLine():
            Line((-0.8, 0.8), (0, 0.8))
            ThreePointArc((0, 0.8), (0.234314575, 0.234314575), (0.8, 0))
            Line((0.8, 0), (0.8, -0.8))
            ThreePointArc((0.8, -0.8), (-0.33137085, -0.33137085), (-0.8, 0.8))
        make_face()
    extrude(amount=SM_EDGE_FLANGE_4_DEPTH)

    # Ребро-кромка4 profile (on flange) → Ребро-кромка4 flat (add)
    with BuildSketch(Plane(origin=(-54.73, 0.8, 0), x_dir=(0, 0, 1), z_dir=(-1, 0, 0)).offset(SM_START_13)):
        with BuildLine():
            Line((-6.67, 11.43), (-6.67, 0.8))
            Line((-6.67, 0.8), (12.38, 0.8))
            Line((12.38, 0.8), (12.38, 2.87))
            Line((12.38, 2.87), (9.21, 2.87))
            ThreePointArc((9.21, 2.87), (7, 5.08), (9.21, 7.29))
            Line((9.21, 7.29), (12.38, 7.29))
            Line((12.38, 7.29), (12.38, 11.43))
            Line((12.38, 11.43), (4.76, 11.43))
            Line((4.76, 11.43), (4.76, 7.24))
            Line((4.76, 7.24), (1.71, 7.24))
            Line((1.71, 7.24), (1.71, 11.43))
            Line((1.71, 11.43), (-6.67, 11.43))
        make_face()
    extrude(amount=-SM_EDGE_FLANGE_4_FLAT_DEPTH)

    # Скругление1
    fillet_1_edges = [part_2.edges().sort_by_distance(p)[0] for p in [
        (65.255403026, 0.839012746, 5.1),
        (65.255403026, 0.839012746, -5.1),
        (40.45, 0.4, 9.21),
        (49.19, 0.4, 9.21),
        (48.79, -9, 8.81),
        (40.85, -9, 8.81),
        (-15.254, 0.4, 9.21),
        (-8.514, 0.4, 9.21),
        (-14.854, -9, 8.81),
        (-6.914, -9, 8.81),
        (-6.914, -1, 8.81),
        (53.93, 0.4, -9.21),
        (58.04, 0.4, -5.1),
        (58.04, 0.4, 5.1),
        (53.93, 0.4, 9.21),
        (-55.13, 12.23, -6.67),
        (-55.13, 12.23, 12.38),
    ]]
    fillet(fillet_1_edges, radius=FILLET_1_R)

    # Скругление2
    fillet_2_edges = [part_2.edges().sort_by_distance(p)[0] for p in [
        (-7.26500746, 0.4, 6.6986752),
        (-7.26500746, 0.4, -7.001324342),
        (8.974992541, 0.4, -7.001324342),
        (8.974992541, 0.4, 6.6986752),
        (11.570071277, 0.4, 6.033675466),
        (11.570071277, 0.4, -8.286323773),
        (24.770071277, 0.4, -8.286323773),
        (24.770071277, 0.4, 6.033675466),
        (37.419994901, 0.4, 2.5986752),
        (37.419994901, 0.4, 7.5986752),
        (28.919994901, 0.4, 7.5986752),
        (28.919994901, 0.4, 2.5986752),
    ]]
    fillet(fillet_2_edges, radius=FILLET_2_R)


solid = part_2.part
